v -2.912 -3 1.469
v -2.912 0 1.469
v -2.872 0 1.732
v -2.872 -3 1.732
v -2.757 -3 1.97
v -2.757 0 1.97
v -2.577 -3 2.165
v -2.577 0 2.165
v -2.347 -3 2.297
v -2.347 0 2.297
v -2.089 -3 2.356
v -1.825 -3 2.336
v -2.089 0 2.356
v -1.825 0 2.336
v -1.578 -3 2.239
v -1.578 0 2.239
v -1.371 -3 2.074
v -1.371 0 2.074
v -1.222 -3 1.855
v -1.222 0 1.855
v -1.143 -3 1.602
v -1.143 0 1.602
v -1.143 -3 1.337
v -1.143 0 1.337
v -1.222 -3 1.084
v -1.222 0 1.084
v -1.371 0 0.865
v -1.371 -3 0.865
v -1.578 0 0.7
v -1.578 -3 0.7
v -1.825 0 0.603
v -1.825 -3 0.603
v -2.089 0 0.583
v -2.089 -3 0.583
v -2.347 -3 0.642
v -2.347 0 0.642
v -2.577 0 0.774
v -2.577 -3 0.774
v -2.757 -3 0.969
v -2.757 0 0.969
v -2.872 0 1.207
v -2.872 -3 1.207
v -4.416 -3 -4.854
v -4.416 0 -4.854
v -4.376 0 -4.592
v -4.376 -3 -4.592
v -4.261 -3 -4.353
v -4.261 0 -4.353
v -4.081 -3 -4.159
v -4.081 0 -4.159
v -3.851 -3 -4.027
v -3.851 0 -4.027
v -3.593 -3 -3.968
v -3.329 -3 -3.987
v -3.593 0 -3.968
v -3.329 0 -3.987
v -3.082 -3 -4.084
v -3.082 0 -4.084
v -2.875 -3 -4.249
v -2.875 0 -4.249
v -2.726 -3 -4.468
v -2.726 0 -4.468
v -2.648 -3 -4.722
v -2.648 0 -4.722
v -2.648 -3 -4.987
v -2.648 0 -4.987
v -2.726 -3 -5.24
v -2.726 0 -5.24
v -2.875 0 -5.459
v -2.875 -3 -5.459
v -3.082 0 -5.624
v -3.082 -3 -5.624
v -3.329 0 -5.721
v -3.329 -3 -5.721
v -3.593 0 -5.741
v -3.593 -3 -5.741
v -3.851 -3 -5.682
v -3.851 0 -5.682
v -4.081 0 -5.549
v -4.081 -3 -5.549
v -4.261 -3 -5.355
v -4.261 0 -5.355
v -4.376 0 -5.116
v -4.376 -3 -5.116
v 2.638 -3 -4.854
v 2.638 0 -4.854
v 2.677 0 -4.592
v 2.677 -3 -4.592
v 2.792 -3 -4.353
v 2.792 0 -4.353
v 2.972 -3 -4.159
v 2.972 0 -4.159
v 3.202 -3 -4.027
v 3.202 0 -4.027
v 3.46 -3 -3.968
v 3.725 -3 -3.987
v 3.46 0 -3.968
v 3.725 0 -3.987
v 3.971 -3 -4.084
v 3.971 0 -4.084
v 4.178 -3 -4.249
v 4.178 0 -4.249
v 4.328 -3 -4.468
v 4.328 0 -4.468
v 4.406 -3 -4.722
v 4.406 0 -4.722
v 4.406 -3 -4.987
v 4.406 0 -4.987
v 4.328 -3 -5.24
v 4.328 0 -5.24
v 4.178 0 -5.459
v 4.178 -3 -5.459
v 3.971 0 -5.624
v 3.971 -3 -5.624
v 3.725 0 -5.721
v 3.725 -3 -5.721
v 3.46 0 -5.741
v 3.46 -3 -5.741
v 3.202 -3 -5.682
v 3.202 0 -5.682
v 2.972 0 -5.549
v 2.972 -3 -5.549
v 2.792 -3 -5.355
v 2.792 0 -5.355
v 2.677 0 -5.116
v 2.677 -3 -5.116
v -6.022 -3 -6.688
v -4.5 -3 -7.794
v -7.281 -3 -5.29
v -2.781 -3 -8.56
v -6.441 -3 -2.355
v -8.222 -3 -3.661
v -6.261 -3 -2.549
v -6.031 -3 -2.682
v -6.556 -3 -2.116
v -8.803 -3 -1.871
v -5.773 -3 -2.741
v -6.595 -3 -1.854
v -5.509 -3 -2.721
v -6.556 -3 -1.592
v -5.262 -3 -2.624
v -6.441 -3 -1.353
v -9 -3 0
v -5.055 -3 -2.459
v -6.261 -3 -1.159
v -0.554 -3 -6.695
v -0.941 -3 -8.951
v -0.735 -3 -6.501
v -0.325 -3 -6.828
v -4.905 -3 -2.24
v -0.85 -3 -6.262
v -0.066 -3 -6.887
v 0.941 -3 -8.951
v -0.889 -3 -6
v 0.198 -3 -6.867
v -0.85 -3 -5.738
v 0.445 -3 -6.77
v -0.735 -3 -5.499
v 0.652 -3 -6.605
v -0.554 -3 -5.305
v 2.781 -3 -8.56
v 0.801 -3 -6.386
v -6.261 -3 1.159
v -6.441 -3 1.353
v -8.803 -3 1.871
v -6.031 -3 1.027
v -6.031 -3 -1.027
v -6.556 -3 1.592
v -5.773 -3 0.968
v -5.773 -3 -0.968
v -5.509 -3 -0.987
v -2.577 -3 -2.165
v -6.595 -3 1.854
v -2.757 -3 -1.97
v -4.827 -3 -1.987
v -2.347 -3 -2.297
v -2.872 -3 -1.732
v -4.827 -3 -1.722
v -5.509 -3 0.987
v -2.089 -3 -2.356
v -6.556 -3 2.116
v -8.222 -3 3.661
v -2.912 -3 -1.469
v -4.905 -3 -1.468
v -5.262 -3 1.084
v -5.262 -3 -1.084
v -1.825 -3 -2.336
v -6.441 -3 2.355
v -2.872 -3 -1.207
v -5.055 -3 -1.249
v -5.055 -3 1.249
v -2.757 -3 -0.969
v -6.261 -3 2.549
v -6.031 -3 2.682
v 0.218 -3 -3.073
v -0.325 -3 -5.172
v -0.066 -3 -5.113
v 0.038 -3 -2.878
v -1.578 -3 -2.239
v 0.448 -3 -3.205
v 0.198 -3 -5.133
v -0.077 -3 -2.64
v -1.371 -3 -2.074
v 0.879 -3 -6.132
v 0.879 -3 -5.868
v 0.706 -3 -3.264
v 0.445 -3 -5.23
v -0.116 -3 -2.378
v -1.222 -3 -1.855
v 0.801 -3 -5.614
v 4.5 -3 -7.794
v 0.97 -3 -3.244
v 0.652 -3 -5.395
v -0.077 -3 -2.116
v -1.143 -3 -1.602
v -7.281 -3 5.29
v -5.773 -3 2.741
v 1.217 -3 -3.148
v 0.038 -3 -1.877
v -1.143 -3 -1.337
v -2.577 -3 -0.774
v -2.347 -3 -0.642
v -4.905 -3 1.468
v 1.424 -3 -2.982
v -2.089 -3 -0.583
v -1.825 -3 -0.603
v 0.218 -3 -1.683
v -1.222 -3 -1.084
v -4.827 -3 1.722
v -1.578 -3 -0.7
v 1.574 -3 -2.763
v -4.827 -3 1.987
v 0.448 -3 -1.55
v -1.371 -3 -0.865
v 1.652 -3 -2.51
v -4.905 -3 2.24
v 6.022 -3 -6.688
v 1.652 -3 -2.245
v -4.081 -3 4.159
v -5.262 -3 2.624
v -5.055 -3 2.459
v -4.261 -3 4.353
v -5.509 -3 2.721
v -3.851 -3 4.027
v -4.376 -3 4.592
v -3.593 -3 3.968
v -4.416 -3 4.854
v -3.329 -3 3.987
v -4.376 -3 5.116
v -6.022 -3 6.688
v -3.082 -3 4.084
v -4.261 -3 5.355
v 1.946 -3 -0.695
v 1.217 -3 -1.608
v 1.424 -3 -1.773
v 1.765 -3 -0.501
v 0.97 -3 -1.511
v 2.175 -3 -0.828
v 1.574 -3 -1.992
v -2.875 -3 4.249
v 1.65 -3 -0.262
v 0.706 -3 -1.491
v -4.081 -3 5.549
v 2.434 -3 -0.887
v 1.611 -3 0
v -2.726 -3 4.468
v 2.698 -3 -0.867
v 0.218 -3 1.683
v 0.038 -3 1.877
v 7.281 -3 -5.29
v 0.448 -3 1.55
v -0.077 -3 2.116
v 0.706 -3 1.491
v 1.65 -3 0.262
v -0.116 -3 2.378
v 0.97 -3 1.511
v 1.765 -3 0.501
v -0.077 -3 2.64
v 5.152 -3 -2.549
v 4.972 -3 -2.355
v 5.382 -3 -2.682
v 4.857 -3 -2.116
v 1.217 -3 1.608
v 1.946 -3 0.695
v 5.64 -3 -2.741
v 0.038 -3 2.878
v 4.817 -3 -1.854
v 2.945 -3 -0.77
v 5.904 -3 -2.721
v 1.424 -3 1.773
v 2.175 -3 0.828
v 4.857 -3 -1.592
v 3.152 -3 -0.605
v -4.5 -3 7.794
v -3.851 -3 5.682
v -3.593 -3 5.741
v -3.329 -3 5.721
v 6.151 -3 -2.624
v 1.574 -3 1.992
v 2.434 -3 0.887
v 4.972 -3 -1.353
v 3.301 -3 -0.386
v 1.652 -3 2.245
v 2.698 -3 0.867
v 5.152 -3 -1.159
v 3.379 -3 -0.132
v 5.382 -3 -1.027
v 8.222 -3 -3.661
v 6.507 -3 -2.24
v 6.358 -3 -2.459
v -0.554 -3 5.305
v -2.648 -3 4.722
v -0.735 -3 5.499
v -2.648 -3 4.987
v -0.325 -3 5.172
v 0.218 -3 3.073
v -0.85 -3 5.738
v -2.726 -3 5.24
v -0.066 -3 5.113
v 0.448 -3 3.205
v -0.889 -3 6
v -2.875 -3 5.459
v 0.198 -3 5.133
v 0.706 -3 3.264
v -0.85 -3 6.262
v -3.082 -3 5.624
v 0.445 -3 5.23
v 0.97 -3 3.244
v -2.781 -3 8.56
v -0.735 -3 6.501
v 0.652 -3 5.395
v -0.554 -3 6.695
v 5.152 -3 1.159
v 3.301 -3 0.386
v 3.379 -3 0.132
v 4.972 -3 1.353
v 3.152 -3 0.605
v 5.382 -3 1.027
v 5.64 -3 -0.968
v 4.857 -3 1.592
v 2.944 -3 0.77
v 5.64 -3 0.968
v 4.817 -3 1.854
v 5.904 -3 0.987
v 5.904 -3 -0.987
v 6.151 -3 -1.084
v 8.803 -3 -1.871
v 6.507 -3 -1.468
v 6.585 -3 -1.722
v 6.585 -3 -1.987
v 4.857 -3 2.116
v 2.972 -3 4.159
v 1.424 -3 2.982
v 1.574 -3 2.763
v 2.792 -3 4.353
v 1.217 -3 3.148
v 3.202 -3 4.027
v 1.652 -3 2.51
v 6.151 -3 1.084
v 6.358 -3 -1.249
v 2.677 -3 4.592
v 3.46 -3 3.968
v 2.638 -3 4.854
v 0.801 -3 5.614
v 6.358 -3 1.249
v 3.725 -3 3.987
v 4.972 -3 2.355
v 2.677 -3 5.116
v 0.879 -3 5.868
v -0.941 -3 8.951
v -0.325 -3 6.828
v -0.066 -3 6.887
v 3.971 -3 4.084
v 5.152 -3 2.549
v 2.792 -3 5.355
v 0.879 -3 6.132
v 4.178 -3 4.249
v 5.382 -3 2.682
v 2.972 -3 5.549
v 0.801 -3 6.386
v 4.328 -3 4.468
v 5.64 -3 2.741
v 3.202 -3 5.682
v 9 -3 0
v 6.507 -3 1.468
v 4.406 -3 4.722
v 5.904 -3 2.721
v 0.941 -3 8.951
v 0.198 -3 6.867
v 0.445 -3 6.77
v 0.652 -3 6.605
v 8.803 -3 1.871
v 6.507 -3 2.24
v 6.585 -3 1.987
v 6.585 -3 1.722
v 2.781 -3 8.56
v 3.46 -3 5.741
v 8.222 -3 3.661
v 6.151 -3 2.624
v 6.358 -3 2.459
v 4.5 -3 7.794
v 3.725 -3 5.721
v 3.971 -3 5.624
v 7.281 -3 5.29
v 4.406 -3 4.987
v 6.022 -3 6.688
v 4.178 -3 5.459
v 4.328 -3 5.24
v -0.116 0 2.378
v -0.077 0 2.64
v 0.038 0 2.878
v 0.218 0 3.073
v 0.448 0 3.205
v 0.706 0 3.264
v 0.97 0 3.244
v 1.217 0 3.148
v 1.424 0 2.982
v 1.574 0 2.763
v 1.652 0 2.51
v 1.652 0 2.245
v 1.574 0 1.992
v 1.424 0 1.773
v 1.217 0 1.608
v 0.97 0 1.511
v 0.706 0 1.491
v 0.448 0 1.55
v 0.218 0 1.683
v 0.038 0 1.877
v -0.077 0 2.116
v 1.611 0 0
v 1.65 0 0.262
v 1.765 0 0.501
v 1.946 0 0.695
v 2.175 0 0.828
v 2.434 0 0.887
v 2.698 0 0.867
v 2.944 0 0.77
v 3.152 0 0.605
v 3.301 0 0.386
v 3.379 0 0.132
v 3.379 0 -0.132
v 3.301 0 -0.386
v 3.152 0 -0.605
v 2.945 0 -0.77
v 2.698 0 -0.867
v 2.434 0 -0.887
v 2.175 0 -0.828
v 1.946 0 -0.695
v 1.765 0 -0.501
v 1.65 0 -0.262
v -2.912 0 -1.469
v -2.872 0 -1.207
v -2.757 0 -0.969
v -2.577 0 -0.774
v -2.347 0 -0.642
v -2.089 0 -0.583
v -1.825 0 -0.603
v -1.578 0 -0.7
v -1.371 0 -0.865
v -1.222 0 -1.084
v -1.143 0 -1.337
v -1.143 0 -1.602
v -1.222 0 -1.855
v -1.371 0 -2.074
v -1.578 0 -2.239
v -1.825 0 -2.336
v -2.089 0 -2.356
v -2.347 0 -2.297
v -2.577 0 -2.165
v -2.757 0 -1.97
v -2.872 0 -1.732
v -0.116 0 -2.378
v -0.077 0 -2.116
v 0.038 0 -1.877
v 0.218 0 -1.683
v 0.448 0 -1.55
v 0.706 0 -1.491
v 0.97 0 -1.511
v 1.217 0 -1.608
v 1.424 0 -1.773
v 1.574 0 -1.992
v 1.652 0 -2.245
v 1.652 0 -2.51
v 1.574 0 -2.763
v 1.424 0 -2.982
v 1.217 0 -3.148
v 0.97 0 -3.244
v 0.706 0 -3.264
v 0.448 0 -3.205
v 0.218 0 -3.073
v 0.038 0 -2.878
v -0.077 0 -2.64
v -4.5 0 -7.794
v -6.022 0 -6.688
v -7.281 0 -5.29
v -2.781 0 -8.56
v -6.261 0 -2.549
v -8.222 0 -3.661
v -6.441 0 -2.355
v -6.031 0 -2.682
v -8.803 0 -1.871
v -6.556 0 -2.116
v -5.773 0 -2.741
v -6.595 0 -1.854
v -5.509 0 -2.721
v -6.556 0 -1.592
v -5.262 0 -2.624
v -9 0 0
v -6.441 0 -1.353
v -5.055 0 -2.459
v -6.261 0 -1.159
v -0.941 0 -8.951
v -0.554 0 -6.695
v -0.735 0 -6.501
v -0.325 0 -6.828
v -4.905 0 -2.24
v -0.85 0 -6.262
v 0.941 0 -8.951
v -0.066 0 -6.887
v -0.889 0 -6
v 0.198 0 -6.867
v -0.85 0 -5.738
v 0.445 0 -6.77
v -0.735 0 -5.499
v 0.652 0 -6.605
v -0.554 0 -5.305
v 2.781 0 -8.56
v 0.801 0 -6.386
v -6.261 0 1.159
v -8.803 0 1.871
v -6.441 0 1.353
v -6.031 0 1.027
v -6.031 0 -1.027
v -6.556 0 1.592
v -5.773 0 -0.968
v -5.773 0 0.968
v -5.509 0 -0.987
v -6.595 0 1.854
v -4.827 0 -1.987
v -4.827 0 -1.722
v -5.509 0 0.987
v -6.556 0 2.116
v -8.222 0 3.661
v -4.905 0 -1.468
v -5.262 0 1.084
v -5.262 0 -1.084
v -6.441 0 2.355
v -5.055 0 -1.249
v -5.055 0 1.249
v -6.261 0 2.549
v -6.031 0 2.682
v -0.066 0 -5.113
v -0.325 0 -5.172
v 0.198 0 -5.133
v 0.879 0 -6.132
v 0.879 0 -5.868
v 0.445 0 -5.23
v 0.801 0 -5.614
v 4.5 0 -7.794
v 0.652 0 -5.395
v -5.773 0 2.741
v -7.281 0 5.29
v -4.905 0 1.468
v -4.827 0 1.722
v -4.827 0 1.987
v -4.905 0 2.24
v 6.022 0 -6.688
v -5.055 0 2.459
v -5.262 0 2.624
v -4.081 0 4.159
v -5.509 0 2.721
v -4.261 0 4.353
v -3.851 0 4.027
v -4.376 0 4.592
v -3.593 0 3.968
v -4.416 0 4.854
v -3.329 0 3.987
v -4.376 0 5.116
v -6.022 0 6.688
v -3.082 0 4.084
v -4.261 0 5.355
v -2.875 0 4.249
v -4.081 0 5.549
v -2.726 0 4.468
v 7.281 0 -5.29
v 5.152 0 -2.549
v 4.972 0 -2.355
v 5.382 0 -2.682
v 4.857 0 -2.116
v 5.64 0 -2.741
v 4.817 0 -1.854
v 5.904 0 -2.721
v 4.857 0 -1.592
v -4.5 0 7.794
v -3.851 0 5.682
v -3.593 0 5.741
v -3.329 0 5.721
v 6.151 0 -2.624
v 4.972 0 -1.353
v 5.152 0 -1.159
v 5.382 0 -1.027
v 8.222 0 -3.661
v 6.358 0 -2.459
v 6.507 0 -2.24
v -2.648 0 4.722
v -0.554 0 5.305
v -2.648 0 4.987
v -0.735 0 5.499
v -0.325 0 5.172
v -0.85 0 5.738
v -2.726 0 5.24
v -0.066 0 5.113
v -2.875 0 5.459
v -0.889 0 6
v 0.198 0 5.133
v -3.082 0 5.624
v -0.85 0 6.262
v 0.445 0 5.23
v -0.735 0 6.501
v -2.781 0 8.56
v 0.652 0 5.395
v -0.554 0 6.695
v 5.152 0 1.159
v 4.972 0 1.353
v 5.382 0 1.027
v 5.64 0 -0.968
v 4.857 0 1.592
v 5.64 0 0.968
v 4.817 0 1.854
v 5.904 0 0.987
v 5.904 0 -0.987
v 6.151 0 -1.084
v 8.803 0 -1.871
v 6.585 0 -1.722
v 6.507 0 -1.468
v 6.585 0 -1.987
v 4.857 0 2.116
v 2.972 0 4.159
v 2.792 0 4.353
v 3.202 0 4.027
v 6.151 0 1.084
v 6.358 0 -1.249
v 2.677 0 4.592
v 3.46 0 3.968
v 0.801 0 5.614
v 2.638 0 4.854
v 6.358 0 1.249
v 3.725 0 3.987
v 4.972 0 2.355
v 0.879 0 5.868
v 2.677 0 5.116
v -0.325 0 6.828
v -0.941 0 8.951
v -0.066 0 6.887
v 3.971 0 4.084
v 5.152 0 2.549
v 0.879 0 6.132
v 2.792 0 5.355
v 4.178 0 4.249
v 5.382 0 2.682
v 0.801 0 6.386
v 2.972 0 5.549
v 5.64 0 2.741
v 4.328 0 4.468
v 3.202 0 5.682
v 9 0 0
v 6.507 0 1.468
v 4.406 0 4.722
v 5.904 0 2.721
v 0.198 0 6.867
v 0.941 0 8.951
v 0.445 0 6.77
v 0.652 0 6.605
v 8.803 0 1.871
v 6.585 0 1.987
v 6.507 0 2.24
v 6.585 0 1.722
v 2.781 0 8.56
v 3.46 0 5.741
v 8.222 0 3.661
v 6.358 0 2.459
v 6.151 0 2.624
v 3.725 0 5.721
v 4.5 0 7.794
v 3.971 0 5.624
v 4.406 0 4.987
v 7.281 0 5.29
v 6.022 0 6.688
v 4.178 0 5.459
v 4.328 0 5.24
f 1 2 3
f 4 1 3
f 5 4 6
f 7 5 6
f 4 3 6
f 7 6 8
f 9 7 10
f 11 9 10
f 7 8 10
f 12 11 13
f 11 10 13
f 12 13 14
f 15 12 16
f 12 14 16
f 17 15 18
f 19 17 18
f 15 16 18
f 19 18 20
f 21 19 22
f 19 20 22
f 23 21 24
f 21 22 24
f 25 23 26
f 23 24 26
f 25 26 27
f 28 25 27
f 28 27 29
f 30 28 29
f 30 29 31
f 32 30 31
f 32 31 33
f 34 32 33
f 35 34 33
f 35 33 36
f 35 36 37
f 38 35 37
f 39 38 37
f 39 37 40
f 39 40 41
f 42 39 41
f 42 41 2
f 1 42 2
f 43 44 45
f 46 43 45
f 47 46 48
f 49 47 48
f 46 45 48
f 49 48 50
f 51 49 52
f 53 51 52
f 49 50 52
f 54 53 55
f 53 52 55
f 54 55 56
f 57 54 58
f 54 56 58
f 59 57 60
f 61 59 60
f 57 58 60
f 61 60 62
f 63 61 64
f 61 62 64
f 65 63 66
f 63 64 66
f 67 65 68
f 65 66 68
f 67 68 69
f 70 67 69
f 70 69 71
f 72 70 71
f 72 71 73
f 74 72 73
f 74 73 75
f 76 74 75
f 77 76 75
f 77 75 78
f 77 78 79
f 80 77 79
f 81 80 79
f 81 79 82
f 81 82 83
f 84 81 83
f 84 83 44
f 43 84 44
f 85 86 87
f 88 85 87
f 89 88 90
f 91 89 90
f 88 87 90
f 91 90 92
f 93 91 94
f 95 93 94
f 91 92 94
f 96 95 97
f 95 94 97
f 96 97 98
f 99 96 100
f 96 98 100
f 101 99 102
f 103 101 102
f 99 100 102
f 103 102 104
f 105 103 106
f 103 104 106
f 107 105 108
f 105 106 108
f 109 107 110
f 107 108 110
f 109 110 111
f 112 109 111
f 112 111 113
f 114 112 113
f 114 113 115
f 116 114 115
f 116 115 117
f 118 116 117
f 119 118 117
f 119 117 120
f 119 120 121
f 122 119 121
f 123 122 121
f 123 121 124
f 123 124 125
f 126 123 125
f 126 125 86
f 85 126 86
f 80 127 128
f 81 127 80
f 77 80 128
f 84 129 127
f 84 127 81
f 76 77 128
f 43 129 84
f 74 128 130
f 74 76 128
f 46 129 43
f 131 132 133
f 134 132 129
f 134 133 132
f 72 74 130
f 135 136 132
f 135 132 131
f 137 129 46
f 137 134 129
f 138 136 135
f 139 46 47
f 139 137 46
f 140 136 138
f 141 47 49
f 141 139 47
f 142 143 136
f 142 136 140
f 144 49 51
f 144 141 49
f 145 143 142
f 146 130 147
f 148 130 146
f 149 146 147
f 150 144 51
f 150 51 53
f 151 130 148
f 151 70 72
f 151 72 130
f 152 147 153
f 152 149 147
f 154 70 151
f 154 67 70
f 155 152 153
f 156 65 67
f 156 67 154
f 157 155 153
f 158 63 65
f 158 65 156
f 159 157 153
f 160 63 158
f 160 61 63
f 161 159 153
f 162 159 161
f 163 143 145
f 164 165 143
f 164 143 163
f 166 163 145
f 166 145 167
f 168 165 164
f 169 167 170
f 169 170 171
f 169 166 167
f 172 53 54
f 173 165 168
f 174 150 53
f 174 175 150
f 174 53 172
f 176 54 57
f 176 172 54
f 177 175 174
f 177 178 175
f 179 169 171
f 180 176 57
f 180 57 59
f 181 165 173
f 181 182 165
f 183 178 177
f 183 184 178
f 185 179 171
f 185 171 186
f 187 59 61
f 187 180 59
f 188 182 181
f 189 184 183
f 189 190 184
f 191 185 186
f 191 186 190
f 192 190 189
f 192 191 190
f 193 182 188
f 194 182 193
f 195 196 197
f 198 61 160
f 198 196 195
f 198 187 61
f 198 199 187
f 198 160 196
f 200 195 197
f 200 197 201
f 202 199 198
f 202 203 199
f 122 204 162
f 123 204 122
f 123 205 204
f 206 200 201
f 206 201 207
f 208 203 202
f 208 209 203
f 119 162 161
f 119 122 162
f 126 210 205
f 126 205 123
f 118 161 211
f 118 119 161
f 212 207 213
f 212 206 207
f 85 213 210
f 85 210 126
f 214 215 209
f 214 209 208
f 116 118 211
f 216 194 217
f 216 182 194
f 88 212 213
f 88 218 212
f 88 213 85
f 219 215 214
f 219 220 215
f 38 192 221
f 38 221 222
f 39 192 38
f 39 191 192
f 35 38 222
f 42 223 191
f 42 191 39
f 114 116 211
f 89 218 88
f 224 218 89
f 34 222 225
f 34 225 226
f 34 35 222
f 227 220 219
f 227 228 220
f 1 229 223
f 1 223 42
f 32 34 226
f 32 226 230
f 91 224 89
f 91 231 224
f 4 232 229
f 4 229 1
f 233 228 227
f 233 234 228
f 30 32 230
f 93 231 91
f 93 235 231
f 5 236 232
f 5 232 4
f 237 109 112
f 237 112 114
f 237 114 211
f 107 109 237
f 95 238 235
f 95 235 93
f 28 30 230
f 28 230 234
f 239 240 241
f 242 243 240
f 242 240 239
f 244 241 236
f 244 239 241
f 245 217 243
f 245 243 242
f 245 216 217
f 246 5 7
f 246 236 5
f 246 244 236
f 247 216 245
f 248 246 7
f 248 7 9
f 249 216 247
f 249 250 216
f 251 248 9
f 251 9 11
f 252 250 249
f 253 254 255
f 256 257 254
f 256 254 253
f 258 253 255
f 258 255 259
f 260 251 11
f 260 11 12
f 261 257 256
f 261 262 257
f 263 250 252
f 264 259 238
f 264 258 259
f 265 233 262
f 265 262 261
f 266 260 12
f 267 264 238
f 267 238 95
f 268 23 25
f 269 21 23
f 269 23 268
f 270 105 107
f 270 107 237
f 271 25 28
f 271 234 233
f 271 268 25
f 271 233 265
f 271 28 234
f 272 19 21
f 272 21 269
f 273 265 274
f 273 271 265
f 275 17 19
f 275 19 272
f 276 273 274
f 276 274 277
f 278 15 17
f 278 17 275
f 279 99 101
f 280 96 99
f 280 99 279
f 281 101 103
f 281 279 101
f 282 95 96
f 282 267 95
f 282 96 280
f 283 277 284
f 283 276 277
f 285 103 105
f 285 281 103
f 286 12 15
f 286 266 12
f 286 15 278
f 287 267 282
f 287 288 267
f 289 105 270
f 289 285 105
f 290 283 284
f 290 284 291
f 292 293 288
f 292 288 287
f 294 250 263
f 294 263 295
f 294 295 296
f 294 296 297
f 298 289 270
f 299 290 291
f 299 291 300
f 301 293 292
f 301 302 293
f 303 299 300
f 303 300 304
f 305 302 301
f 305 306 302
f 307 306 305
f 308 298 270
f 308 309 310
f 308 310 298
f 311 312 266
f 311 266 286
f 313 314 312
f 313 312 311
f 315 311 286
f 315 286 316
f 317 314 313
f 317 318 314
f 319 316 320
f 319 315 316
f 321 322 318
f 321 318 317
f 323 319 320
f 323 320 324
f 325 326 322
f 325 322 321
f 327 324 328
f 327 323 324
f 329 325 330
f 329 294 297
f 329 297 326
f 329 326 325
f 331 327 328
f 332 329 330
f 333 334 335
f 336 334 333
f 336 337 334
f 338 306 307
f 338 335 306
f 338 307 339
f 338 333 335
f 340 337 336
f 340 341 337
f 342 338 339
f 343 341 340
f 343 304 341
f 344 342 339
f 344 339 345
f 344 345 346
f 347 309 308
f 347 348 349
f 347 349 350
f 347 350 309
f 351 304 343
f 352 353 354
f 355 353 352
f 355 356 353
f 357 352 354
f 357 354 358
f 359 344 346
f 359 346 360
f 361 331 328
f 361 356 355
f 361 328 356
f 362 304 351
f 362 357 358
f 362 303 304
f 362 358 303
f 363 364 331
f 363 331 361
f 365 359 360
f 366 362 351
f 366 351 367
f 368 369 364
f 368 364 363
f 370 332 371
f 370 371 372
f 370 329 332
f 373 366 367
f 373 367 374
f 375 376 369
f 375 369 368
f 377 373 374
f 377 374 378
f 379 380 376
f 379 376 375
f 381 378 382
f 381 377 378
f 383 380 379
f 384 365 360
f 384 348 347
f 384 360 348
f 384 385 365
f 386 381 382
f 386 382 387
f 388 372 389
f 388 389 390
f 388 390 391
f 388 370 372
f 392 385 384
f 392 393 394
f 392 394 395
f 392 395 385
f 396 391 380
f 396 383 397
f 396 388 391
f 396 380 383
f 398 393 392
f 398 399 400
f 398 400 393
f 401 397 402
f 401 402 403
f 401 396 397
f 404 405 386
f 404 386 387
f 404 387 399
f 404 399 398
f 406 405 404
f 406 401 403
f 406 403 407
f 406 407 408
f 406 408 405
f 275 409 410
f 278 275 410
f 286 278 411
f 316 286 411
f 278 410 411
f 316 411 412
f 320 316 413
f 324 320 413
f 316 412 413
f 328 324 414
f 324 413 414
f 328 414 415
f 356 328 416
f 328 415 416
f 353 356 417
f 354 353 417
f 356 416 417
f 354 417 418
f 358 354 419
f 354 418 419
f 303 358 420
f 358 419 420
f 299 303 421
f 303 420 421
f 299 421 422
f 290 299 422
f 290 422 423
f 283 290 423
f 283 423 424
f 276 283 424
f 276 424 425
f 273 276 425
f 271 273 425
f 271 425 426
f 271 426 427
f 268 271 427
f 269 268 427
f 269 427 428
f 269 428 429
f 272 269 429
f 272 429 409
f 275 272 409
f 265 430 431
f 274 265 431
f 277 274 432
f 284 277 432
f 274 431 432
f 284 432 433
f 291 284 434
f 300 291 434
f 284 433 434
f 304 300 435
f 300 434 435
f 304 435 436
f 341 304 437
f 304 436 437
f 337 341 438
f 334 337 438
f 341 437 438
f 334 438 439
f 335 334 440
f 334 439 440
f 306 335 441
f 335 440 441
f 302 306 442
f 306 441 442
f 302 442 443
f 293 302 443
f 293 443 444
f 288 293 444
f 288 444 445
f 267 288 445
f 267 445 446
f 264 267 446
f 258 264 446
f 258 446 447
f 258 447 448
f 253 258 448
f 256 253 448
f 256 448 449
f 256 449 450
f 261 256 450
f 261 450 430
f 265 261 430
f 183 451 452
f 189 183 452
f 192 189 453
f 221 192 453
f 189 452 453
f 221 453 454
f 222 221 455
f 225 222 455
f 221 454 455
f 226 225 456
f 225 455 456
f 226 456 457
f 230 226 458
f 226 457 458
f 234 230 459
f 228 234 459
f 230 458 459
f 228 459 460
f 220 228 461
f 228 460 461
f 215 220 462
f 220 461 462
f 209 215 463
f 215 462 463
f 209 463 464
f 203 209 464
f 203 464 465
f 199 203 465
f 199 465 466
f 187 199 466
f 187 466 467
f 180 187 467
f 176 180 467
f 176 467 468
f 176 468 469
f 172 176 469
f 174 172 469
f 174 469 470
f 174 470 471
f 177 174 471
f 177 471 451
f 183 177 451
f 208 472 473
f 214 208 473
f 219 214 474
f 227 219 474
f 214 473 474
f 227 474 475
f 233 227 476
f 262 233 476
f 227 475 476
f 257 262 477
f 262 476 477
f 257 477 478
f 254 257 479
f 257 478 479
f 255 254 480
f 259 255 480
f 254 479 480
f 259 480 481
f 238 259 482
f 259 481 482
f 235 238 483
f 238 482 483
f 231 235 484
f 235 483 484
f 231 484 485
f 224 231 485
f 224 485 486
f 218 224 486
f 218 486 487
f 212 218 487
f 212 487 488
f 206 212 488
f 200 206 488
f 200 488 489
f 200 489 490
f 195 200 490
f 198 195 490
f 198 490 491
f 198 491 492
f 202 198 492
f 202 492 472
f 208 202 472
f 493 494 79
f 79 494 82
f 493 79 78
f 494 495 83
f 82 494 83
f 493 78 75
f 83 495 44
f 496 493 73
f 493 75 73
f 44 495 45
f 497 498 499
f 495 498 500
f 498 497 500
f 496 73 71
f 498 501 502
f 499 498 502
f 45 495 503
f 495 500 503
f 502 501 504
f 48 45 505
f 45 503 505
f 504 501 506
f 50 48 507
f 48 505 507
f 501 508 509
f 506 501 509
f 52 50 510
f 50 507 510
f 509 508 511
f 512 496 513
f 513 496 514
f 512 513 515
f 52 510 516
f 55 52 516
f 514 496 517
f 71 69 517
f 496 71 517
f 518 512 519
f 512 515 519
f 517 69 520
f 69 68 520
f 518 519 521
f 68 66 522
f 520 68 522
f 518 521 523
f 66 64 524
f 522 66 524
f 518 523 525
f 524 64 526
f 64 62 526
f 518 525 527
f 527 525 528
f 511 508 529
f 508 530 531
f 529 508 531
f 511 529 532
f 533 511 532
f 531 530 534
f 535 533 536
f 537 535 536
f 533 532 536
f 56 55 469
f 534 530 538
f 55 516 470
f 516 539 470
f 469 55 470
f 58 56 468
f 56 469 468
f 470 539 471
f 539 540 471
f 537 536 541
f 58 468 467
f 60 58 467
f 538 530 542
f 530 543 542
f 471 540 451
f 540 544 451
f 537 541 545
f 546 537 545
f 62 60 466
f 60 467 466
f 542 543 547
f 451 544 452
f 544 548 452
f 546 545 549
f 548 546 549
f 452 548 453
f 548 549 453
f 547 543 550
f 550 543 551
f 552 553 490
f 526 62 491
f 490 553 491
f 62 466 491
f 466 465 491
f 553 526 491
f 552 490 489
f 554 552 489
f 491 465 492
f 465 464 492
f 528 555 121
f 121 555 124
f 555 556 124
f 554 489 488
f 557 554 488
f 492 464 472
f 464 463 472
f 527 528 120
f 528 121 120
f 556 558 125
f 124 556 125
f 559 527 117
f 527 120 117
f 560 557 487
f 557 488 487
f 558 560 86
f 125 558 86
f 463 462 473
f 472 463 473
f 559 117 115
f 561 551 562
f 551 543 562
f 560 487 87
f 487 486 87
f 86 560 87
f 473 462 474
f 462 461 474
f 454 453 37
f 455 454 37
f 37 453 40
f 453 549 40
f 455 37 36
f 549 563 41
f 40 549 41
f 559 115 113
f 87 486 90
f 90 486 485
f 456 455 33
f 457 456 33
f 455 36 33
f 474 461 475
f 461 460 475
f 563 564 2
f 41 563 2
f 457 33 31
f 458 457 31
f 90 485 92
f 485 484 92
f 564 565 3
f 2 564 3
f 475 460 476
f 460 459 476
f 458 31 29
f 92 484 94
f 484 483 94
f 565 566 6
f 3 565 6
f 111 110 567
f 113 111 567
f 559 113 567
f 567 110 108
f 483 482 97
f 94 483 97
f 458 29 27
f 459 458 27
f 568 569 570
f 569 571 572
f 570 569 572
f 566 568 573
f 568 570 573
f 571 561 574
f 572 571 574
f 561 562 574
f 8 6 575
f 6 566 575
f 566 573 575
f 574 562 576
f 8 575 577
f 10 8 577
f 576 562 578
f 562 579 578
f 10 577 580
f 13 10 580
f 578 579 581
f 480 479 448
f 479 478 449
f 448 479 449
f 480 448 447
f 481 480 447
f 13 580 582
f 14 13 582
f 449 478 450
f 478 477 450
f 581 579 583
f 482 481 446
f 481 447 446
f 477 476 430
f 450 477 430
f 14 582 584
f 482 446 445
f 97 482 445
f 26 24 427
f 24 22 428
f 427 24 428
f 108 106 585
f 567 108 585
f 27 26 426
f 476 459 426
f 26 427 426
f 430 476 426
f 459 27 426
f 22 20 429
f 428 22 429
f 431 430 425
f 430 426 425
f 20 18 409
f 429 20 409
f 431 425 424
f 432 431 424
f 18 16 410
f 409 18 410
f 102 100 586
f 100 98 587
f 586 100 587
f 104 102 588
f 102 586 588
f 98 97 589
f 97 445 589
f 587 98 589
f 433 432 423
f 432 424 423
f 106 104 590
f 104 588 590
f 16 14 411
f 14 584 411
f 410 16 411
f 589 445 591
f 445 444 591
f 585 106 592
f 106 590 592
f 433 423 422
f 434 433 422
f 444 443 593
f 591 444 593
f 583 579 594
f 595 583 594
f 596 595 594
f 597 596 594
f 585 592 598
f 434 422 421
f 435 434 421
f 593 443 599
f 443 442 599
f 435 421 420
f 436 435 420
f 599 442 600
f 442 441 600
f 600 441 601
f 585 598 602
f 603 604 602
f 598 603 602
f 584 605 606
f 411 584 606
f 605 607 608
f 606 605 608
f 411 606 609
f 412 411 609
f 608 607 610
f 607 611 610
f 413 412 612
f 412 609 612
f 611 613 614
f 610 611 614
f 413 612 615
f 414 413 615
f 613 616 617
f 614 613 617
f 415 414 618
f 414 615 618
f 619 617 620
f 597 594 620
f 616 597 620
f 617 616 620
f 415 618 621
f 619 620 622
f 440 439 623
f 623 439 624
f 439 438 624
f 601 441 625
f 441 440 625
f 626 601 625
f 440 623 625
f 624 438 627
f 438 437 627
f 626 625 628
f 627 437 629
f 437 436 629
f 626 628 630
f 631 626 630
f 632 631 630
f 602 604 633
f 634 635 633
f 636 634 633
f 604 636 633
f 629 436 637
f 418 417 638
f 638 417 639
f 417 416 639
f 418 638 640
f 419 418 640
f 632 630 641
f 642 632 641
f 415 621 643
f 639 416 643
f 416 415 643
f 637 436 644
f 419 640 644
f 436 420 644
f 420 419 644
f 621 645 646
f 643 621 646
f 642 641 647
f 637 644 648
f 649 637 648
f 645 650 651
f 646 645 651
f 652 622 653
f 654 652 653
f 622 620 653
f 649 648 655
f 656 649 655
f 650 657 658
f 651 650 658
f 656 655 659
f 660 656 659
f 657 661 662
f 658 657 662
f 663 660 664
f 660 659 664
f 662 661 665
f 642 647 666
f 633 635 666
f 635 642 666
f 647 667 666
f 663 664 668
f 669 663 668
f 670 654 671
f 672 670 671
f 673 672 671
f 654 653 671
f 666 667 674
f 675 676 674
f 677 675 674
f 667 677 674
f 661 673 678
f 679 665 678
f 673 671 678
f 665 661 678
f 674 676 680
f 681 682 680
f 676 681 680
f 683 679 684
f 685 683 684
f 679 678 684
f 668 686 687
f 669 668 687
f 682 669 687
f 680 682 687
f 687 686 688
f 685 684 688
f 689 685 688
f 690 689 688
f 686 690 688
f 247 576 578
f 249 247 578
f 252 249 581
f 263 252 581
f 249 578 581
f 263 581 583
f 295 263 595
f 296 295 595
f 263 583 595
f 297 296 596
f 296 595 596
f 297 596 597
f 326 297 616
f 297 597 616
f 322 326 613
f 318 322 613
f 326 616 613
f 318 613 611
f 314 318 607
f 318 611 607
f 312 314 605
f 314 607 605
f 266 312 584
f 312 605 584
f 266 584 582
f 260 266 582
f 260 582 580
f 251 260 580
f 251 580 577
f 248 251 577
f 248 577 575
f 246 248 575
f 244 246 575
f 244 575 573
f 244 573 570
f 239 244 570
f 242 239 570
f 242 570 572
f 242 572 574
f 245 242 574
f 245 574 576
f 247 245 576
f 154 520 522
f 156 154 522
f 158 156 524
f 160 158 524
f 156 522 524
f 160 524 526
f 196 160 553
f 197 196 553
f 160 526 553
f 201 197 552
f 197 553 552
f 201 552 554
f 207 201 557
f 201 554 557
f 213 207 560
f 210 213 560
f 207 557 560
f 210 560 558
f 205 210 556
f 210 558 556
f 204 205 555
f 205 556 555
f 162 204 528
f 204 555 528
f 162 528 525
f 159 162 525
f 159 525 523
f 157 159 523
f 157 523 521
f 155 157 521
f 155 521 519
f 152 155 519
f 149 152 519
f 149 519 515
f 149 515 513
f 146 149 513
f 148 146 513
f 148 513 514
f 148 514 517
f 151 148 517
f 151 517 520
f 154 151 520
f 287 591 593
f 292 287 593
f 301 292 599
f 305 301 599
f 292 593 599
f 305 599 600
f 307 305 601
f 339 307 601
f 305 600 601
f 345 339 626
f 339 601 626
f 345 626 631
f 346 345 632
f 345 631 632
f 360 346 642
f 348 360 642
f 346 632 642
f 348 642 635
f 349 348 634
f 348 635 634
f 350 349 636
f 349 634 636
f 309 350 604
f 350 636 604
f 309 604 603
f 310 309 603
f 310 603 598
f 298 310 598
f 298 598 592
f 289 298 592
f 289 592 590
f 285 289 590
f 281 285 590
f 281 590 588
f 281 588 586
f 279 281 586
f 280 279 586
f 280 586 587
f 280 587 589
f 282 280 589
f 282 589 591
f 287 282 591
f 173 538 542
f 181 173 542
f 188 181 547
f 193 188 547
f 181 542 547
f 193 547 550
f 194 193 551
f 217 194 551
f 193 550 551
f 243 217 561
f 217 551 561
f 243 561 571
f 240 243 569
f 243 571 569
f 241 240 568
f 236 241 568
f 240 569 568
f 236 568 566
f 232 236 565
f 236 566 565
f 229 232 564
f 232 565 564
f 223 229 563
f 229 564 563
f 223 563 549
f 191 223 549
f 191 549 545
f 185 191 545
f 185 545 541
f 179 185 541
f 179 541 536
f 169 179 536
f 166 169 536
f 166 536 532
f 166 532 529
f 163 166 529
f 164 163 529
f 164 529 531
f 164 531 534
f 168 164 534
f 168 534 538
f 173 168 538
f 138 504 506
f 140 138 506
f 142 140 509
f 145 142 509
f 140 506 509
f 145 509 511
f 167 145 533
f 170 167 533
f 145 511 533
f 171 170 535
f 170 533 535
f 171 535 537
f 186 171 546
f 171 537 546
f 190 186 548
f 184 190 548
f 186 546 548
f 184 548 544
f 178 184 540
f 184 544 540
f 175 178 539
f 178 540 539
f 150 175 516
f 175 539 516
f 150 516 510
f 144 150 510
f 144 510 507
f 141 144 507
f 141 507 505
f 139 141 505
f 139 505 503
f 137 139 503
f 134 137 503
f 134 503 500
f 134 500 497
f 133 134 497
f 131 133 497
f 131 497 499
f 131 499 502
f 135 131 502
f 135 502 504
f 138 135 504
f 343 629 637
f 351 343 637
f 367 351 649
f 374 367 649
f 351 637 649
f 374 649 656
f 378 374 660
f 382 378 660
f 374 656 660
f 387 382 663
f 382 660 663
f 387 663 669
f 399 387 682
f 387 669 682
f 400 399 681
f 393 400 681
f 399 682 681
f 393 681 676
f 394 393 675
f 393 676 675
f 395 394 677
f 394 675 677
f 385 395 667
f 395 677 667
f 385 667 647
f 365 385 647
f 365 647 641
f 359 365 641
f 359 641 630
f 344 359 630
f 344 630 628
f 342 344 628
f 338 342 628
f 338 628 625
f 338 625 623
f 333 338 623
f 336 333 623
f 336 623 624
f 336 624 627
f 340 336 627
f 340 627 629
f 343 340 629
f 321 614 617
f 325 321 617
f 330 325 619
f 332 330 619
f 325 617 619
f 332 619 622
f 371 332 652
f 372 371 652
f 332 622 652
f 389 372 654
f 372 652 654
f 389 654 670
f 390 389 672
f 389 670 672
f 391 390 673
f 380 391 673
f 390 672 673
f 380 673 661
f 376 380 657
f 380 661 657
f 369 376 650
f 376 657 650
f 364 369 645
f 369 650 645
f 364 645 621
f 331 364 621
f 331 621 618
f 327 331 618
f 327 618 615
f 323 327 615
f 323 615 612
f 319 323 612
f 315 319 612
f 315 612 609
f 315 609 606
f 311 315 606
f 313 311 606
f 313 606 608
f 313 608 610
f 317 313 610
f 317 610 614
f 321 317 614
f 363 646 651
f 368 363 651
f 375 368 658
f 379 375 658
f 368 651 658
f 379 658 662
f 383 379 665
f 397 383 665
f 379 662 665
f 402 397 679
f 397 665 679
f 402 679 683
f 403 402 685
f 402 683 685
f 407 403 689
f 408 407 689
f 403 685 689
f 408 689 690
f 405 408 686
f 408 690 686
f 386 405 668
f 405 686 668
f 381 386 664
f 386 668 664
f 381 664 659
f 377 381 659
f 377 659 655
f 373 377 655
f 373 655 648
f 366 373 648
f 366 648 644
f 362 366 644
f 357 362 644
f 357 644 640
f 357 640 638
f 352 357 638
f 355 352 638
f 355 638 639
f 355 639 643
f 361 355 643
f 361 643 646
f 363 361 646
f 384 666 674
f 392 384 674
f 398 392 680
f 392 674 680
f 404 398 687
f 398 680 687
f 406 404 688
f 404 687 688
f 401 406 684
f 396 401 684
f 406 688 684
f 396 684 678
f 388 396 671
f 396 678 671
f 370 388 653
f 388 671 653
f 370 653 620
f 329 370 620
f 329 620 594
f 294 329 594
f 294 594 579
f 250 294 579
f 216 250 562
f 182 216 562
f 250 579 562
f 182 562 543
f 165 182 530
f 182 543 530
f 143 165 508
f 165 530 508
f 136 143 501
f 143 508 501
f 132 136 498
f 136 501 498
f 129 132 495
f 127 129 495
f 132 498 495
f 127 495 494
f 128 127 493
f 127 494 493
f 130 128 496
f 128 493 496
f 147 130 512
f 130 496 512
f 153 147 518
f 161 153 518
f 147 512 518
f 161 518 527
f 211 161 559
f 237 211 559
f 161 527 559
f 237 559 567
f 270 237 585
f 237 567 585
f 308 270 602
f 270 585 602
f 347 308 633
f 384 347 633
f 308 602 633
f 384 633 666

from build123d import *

# Parameters (mm, degrees)
F0_R     = 9
F1_DEPTH = 3
F3_D     = 1.778
F3_DEPTH = 15
F3_TIP   = 0.5341650903


# Not quite as in the source:
# - a feature names something its author has since deleted; it is built from what else it names


with BuildPart() as f1:
    # F0 (on Front) → F1 (new body)
    with BuildSketch(Plane.XZ):
        Circle(F0_R)
    extrude(amount=F1_DEPTH)

    # F3
    with Locations(Plane.XZ.offset(3)):
        with Locations((-3.5267115138, 4.8541019662), (-5.7063390978, 1.8541019662), (-5.7063390978, -1.8541019662), (-3.5267115138, -4.8541019662), (0, -6), (3.5267115138, -4.8541019662), (5.7063390978, -1.8541019662), (0, 6), (-2.0225424859, 1.4694631307), (-2.0225424859, -1.4694631307), (0.7725424859, -2.3776412907), (2.5, 0), (0.7725424859, 2.3776412907), (3.5267115138, 4.8541019662), (5.7063390978, 1.8541019662)):
            Hole(F3_D / 2, depth=F3_DEPTH)
            with Locations((0, 0, -(F3_DEPTH + F3_TIP / 2))):  # 118° drill point
                Cone(0, F3_D / 2, F3_TIP, mode=Mode.SUBTRACT)


solid = f1.part
